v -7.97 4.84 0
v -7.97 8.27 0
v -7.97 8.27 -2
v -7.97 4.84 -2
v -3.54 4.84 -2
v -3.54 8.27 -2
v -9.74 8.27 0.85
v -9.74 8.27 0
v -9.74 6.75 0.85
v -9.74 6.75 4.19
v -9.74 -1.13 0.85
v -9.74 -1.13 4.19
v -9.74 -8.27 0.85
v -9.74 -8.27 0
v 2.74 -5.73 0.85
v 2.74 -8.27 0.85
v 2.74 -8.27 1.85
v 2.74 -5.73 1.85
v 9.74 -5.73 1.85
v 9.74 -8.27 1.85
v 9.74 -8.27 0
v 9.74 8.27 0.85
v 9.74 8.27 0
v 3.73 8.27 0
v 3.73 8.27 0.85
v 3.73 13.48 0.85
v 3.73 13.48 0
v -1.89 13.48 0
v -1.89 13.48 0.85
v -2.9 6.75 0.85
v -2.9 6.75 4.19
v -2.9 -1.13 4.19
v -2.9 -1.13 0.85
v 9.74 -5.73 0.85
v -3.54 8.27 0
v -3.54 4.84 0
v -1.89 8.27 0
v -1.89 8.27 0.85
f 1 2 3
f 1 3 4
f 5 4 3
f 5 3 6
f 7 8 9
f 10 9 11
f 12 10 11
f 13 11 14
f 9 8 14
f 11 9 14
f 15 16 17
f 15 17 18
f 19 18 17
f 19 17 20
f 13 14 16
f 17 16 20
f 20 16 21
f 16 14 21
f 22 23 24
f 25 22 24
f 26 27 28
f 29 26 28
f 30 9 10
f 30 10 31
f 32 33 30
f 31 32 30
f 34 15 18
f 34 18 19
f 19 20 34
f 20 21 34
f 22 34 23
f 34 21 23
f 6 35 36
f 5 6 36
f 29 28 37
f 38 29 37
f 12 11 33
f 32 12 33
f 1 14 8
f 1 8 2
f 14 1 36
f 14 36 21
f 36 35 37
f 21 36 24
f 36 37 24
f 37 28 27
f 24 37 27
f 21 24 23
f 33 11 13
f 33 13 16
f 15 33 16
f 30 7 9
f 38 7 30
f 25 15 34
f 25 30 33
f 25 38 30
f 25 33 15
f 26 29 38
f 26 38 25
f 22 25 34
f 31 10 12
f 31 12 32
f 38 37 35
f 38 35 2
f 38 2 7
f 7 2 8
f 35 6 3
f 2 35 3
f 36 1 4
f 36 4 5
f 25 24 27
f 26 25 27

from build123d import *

# Parameters (mm, degrees)
F1_DEPTH = 0.85
F2_W     = 6.84
F2_H     = 7.88
F3_DEPTH = 3.34
F4_W     = 7
F4_H     = 2.54
F5_DEPTH = 1
F6_W     = 4.43
F6_H     = 3.43
F7_DEPTH = 2


with BuildPart() as f1:
    # F0 (on Top) → F1 (new body)
    with BuildSketch(Plane.XY):
        Polygon((-9.74, -8.27), (9.74, -8.27), (9.74, 8.27), (3.73, 8.27), (3.73, 13.48), (-1.89, 13.48), (-1.89, 8.27), (-9.74, 8.27), align=None)
    extrude(amount=F1_DEPTH)

    # F2 (on face) → F3 (join)
    with BuildSketch(Plane.XY.offset(0.85)):
        with Locations((-6.32, 2.81)):
            Rectangle(F2_W, F2_H)
    extrude(amount=F3_DEPTH)

    # F4 (on face) → F5 (join)
    with BuildSketch(Plane.XY.offset(0.85)):
        with Locations((6.24, -7)):
            Rectangle(F4_W, F4_H)
    extrude(amount=F5_DEPTH)

    # F6 (on face) → F7 (join)
    with BuildSketch(Plane(origin=(0, 0, 0), x_dir=(1, 0, 0), z_dir=(0, 0, -1))):
        with Locations((-5.755, -6.555)):
            Rectangle(F6_W, F6_H)
    extrude(amount=F7_DEPTH)


solid = f1.part
